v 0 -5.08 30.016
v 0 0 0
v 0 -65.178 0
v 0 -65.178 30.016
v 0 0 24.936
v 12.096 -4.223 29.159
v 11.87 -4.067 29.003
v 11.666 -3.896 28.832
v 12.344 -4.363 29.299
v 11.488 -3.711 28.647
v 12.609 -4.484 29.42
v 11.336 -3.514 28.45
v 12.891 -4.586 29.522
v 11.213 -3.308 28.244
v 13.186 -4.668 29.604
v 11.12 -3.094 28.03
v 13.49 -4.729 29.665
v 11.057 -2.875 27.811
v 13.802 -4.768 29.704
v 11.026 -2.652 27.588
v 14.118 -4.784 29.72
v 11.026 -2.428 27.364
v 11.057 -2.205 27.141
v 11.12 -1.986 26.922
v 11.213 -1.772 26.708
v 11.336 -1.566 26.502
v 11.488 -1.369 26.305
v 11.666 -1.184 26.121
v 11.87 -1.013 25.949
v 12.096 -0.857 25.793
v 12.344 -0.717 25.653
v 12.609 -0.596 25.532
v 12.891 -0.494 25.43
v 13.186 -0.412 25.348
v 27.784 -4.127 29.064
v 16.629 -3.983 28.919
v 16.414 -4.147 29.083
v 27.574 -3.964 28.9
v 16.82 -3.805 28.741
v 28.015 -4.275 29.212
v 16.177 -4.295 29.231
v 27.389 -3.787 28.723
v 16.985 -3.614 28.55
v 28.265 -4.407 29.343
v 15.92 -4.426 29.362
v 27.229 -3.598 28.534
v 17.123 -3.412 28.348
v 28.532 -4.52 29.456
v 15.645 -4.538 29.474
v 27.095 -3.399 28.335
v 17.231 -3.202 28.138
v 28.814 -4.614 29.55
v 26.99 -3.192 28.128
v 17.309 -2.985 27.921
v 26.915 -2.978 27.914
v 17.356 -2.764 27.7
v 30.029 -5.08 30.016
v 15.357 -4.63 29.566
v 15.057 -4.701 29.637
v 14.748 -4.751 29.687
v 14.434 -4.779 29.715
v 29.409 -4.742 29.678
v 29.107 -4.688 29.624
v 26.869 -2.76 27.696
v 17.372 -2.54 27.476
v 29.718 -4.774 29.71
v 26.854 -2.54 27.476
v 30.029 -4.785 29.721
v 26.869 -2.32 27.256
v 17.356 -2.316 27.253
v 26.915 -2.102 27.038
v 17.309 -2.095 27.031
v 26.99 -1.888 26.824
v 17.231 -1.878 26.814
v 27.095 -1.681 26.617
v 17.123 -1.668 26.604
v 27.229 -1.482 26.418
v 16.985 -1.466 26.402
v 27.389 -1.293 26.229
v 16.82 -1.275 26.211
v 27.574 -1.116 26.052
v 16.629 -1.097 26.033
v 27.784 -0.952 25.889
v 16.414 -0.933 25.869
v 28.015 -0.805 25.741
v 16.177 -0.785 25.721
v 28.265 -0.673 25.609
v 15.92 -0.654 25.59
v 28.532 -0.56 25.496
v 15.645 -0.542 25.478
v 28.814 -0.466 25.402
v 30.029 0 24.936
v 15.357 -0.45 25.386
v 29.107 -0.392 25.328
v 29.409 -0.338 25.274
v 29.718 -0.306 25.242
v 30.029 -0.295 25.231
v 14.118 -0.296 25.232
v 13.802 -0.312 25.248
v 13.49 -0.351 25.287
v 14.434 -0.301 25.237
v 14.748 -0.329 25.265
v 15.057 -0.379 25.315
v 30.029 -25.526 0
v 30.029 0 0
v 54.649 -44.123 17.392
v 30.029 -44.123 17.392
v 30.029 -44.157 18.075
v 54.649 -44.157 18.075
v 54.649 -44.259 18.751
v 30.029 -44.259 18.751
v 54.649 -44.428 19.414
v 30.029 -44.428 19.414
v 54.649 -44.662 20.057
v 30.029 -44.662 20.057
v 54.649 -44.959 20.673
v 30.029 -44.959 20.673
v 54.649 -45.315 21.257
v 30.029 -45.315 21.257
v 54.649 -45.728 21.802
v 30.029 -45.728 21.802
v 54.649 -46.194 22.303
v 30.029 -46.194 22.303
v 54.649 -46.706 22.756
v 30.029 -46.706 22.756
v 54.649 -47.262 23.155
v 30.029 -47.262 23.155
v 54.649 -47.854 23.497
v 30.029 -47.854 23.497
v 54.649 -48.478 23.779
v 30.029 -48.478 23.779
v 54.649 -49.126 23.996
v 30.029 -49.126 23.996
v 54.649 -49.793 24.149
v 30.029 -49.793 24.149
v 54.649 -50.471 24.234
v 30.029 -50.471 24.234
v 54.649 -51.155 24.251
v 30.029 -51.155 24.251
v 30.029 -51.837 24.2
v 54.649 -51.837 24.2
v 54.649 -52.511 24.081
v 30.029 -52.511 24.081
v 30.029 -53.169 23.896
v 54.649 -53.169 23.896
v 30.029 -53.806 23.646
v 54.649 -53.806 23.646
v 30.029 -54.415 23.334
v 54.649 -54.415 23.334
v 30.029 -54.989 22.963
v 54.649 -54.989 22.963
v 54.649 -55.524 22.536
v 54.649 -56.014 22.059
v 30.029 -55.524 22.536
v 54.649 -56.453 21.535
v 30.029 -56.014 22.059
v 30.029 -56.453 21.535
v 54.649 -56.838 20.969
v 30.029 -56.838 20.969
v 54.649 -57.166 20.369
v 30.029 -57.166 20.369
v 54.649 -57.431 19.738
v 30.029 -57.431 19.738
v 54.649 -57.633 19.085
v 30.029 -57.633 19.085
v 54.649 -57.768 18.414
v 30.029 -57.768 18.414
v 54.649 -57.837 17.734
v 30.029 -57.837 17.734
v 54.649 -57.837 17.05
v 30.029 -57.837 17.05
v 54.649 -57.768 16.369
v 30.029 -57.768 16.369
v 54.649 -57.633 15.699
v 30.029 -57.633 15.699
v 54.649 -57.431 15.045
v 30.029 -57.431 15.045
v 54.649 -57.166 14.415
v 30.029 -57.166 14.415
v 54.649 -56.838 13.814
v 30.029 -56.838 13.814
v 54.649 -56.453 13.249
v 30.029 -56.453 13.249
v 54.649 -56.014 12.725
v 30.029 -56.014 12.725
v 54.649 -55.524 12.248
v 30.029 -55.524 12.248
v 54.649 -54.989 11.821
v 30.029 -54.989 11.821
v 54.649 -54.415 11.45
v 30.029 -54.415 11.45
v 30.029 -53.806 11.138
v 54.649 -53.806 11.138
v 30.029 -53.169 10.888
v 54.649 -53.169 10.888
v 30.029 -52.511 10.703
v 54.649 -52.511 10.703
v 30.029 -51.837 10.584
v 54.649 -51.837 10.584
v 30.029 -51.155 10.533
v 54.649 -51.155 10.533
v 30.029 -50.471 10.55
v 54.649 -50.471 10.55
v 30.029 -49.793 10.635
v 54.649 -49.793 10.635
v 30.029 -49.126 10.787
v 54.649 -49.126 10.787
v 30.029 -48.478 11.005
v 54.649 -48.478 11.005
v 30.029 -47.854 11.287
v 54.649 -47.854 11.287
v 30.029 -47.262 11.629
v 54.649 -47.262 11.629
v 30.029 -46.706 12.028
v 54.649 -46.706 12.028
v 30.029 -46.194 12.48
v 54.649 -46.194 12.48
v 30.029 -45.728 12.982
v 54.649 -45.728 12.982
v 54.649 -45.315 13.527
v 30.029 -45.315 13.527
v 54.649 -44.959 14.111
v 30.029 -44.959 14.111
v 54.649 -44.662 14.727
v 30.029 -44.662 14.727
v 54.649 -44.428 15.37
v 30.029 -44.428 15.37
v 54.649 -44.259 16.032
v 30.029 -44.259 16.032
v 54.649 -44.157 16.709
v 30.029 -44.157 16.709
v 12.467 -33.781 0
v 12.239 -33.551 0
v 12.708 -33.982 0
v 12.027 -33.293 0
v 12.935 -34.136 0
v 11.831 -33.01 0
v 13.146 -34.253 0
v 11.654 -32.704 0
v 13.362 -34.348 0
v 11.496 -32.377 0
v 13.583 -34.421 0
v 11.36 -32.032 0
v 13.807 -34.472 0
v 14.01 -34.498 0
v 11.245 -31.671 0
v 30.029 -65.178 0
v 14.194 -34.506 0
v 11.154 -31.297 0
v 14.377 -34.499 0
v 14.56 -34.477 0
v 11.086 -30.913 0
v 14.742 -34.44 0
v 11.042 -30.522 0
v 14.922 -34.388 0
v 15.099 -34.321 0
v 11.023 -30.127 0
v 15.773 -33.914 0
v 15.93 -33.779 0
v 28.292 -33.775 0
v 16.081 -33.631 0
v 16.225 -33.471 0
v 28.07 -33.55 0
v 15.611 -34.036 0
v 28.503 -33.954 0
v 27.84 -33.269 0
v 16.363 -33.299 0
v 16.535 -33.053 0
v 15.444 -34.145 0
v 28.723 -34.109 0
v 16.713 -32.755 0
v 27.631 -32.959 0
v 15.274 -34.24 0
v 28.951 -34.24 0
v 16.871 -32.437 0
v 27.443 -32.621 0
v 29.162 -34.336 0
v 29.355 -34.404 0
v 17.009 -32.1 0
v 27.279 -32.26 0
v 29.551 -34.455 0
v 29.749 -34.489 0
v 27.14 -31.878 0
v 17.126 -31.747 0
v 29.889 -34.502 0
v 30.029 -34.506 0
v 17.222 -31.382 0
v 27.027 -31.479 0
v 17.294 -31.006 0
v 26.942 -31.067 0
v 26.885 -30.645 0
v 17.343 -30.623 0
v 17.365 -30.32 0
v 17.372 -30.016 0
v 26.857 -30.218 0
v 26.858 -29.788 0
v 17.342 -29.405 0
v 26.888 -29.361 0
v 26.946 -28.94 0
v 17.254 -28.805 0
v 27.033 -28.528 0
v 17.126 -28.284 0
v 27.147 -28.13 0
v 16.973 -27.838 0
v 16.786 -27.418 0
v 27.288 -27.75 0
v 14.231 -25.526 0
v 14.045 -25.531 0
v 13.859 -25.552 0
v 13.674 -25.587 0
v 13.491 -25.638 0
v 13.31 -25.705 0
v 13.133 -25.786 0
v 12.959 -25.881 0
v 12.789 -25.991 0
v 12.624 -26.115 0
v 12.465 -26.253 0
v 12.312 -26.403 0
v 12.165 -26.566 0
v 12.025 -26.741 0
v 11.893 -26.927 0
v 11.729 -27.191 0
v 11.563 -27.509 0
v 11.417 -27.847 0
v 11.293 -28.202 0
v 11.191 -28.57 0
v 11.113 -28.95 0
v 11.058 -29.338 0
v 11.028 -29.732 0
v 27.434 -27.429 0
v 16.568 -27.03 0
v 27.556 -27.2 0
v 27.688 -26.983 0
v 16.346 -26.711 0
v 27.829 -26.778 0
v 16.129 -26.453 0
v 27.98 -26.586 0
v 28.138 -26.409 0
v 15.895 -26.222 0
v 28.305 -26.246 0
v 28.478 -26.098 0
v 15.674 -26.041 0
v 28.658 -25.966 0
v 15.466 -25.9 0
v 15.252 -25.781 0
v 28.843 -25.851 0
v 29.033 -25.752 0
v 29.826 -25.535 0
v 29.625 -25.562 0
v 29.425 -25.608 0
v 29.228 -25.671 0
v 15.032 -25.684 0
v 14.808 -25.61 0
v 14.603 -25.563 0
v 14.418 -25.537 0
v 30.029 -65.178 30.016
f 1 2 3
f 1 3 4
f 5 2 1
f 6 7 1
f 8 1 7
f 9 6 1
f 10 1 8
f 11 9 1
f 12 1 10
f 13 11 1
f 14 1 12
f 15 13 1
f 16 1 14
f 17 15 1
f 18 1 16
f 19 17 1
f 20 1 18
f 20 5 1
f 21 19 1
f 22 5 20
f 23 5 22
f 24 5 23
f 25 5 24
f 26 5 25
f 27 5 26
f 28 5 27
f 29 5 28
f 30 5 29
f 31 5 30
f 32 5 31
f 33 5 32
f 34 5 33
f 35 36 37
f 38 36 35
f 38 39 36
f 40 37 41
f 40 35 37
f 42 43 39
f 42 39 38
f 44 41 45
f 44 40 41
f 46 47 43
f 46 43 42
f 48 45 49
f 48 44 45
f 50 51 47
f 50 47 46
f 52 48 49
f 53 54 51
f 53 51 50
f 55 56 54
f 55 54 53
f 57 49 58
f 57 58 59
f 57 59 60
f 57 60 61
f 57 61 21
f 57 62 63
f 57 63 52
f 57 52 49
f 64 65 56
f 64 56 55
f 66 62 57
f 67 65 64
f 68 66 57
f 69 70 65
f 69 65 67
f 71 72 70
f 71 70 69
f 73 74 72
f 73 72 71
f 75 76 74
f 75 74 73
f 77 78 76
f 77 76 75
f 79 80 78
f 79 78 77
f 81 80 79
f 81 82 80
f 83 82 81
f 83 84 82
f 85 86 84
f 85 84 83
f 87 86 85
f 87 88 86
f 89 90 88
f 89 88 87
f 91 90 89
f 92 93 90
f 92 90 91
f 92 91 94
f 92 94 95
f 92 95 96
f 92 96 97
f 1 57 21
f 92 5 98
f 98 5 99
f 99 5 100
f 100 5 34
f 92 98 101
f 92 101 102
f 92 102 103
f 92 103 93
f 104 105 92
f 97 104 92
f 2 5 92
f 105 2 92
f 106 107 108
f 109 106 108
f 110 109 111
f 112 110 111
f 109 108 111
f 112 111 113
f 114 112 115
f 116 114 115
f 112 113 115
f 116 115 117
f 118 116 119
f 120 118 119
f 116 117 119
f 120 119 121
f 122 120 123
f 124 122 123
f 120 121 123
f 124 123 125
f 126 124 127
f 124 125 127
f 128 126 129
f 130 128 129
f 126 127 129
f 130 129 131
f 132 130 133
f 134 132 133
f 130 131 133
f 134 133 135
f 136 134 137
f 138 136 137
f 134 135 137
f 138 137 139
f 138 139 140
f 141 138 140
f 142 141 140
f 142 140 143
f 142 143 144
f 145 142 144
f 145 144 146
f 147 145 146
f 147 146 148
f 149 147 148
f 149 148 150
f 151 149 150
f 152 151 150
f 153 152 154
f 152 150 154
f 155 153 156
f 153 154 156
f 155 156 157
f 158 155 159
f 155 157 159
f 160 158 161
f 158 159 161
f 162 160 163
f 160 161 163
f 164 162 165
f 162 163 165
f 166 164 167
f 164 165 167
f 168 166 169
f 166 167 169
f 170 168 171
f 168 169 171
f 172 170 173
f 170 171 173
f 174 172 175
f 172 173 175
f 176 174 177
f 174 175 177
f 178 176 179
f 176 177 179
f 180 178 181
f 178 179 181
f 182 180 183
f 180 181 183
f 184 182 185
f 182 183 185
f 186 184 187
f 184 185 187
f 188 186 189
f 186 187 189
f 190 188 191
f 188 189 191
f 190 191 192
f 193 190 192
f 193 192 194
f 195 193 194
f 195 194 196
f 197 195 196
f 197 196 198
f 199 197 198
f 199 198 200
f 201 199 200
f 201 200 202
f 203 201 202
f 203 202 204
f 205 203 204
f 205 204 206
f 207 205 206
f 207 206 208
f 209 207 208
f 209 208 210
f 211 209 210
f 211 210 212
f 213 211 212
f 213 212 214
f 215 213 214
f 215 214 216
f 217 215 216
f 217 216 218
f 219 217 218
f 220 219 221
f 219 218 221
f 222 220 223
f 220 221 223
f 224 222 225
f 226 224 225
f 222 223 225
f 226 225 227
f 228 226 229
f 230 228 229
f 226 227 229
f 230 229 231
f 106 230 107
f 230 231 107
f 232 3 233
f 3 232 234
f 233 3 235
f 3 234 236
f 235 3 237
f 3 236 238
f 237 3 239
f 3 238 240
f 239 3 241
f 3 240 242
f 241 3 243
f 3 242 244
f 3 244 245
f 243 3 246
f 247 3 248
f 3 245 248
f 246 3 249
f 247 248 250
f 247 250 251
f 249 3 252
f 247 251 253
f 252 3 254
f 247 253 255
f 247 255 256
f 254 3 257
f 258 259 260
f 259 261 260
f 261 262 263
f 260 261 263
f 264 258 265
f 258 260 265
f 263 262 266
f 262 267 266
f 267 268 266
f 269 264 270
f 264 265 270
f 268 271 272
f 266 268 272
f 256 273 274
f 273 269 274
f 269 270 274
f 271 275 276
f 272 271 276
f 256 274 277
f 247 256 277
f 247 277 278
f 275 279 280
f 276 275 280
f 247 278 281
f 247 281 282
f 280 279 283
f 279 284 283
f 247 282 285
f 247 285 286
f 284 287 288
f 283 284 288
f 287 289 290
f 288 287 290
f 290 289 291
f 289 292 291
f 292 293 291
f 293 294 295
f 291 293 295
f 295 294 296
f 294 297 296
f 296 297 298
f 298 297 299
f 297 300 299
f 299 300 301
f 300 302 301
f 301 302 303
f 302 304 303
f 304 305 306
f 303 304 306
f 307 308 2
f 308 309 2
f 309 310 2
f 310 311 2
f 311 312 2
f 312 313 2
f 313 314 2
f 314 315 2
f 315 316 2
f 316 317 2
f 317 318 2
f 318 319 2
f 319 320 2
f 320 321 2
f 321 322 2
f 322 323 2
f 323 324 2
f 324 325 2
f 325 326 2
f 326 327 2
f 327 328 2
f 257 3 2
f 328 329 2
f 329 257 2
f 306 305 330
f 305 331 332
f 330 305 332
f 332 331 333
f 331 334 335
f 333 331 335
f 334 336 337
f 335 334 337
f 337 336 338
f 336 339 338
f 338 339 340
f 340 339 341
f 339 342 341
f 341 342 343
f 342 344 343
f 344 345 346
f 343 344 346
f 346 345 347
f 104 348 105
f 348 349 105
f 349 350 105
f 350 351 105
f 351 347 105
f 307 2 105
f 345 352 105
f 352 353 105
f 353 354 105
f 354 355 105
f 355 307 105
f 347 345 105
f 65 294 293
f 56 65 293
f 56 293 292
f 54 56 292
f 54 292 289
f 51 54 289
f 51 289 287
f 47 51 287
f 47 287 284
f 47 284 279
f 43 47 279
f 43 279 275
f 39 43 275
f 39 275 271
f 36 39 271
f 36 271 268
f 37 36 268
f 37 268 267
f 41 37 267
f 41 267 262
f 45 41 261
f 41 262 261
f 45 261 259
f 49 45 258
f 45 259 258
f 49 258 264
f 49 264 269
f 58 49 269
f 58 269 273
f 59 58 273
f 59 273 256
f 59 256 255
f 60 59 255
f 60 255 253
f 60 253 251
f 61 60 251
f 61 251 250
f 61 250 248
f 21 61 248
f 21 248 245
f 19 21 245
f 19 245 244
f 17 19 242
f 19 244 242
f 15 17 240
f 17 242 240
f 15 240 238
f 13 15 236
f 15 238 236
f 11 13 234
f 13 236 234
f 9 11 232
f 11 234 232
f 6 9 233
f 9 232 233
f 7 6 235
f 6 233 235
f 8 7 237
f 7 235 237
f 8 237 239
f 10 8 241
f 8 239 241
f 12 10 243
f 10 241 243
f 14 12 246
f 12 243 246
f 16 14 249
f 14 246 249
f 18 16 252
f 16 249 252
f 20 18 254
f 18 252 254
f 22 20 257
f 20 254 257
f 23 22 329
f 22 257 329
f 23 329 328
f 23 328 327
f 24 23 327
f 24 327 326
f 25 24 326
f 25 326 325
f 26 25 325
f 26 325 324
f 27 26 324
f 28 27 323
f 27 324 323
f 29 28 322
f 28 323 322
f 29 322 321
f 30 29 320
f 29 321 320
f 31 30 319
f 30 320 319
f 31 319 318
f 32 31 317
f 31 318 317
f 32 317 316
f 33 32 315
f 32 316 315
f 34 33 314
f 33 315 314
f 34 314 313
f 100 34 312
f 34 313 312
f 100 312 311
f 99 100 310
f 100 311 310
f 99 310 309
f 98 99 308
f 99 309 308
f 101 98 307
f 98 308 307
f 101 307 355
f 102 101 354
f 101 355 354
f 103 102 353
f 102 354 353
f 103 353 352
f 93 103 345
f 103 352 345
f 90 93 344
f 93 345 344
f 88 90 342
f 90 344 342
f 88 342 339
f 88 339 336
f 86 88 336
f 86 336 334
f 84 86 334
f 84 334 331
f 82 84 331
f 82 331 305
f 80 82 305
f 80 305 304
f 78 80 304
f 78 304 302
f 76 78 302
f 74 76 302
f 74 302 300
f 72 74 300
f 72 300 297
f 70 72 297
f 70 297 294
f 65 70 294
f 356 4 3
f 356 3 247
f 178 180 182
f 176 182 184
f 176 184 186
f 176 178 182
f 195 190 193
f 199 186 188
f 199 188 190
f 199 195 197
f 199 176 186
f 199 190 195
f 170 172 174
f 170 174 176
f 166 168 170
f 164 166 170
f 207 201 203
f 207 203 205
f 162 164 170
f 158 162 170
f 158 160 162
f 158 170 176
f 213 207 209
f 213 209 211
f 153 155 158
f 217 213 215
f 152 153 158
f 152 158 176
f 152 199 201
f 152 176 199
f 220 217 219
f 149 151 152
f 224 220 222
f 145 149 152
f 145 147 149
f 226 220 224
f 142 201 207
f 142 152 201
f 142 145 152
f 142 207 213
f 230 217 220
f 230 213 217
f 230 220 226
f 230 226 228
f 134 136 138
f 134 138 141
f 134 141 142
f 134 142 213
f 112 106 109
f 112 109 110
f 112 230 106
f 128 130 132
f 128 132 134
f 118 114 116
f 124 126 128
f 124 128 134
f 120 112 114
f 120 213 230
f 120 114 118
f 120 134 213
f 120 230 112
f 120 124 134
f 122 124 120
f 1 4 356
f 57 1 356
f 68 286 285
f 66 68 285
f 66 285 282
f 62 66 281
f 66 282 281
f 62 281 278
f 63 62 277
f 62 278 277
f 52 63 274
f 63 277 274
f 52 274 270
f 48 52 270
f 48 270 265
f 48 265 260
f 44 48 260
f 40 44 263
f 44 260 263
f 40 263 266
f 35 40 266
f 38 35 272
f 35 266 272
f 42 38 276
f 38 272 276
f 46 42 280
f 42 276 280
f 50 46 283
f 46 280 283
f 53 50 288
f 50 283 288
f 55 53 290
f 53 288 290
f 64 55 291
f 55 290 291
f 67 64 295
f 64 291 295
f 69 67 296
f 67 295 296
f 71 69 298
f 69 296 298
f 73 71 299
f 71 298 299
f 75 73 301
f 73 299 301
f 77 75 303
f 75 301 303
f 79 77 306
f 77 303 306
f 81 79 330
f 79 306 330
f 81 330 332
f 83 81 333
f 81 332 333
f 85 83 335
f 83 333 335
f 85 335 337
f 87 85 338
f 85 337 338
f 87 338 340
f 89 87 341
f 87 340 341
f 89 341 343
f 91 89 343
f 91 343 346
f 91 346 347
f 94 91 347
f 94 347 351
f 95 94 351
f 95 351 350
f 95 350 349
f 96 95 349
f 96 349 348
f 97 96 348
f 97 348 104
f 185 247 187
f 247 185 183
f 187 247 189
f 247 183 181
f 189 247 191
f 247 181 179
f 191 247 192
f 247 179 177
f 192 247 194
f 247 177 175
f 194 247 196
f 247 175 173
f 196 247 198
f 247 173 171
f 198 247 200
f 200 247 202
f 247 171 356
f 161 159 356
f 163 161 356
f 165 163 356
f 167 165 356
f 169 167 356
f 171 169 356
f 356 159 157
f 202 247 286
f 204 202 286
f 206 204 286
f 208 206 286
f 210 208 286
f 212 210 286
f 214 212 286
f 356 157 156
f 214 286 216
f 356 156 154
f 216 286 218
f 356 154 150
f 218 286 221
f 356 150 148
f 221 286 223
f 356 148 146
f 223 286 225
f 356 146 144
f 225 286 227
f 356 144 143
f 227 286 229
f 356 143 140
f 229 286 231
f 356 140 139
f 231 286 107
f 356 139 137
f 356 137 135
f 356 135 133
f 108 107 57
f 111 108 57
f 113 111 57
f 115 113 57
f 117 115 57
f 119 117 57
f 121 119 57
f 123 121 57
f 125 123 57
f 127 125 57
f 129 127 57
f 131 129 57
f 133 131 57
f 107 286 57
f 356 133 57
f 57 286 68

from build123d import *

# Parameters (mm, degrees)
F0_W     = 30.0287567079
F0_H     = 30.0160832703
F1_DEPTH = 65.17821
F2_R     = 6.8609284015
F3_DEPTH = 24.61977
F4_SIZE  = 5.08
F6_D     = 6.35


with BuildPart() as f1:
    # F0 (on Front) → F1 (new body)
    with BuildSketch(Plane.XZ):
        with Locations((15.014378354, 15.0080416352)):
            Rectangle(F0_W, F0_H)
    extrude(amount=F1_DEPTH)

    # F2 (on face) → F3 (join)
    with BuildSketch(Plane.YZ.offset(30.0287567079)):
        with Locations((-50.9841106832, 17.3919200897)):
            Circle(F2_R)
    extrude(amount=F3_DEPTH)

    # F4
    f4_edges = [f1.edges().sort_by_distance(p)[0] for p in [
        (15.014378, 0, 30.016083),
    ]]
    chamfer(f4_edges, length=F4_SIZE)

    # F6 (through all)
    with Locations(Plane(origin=(0, 12.4680416352, 12.4680416352), x_dir=(-1, 0, 0), z_dir=(0, 0.7071067812, 0.7071067812))):
        with Locations((-14.1969984397, 21.2245760251), (-30.0287567079, 21.2245760251)):
            Hole(F6_D / 2)


solid = f1.part
